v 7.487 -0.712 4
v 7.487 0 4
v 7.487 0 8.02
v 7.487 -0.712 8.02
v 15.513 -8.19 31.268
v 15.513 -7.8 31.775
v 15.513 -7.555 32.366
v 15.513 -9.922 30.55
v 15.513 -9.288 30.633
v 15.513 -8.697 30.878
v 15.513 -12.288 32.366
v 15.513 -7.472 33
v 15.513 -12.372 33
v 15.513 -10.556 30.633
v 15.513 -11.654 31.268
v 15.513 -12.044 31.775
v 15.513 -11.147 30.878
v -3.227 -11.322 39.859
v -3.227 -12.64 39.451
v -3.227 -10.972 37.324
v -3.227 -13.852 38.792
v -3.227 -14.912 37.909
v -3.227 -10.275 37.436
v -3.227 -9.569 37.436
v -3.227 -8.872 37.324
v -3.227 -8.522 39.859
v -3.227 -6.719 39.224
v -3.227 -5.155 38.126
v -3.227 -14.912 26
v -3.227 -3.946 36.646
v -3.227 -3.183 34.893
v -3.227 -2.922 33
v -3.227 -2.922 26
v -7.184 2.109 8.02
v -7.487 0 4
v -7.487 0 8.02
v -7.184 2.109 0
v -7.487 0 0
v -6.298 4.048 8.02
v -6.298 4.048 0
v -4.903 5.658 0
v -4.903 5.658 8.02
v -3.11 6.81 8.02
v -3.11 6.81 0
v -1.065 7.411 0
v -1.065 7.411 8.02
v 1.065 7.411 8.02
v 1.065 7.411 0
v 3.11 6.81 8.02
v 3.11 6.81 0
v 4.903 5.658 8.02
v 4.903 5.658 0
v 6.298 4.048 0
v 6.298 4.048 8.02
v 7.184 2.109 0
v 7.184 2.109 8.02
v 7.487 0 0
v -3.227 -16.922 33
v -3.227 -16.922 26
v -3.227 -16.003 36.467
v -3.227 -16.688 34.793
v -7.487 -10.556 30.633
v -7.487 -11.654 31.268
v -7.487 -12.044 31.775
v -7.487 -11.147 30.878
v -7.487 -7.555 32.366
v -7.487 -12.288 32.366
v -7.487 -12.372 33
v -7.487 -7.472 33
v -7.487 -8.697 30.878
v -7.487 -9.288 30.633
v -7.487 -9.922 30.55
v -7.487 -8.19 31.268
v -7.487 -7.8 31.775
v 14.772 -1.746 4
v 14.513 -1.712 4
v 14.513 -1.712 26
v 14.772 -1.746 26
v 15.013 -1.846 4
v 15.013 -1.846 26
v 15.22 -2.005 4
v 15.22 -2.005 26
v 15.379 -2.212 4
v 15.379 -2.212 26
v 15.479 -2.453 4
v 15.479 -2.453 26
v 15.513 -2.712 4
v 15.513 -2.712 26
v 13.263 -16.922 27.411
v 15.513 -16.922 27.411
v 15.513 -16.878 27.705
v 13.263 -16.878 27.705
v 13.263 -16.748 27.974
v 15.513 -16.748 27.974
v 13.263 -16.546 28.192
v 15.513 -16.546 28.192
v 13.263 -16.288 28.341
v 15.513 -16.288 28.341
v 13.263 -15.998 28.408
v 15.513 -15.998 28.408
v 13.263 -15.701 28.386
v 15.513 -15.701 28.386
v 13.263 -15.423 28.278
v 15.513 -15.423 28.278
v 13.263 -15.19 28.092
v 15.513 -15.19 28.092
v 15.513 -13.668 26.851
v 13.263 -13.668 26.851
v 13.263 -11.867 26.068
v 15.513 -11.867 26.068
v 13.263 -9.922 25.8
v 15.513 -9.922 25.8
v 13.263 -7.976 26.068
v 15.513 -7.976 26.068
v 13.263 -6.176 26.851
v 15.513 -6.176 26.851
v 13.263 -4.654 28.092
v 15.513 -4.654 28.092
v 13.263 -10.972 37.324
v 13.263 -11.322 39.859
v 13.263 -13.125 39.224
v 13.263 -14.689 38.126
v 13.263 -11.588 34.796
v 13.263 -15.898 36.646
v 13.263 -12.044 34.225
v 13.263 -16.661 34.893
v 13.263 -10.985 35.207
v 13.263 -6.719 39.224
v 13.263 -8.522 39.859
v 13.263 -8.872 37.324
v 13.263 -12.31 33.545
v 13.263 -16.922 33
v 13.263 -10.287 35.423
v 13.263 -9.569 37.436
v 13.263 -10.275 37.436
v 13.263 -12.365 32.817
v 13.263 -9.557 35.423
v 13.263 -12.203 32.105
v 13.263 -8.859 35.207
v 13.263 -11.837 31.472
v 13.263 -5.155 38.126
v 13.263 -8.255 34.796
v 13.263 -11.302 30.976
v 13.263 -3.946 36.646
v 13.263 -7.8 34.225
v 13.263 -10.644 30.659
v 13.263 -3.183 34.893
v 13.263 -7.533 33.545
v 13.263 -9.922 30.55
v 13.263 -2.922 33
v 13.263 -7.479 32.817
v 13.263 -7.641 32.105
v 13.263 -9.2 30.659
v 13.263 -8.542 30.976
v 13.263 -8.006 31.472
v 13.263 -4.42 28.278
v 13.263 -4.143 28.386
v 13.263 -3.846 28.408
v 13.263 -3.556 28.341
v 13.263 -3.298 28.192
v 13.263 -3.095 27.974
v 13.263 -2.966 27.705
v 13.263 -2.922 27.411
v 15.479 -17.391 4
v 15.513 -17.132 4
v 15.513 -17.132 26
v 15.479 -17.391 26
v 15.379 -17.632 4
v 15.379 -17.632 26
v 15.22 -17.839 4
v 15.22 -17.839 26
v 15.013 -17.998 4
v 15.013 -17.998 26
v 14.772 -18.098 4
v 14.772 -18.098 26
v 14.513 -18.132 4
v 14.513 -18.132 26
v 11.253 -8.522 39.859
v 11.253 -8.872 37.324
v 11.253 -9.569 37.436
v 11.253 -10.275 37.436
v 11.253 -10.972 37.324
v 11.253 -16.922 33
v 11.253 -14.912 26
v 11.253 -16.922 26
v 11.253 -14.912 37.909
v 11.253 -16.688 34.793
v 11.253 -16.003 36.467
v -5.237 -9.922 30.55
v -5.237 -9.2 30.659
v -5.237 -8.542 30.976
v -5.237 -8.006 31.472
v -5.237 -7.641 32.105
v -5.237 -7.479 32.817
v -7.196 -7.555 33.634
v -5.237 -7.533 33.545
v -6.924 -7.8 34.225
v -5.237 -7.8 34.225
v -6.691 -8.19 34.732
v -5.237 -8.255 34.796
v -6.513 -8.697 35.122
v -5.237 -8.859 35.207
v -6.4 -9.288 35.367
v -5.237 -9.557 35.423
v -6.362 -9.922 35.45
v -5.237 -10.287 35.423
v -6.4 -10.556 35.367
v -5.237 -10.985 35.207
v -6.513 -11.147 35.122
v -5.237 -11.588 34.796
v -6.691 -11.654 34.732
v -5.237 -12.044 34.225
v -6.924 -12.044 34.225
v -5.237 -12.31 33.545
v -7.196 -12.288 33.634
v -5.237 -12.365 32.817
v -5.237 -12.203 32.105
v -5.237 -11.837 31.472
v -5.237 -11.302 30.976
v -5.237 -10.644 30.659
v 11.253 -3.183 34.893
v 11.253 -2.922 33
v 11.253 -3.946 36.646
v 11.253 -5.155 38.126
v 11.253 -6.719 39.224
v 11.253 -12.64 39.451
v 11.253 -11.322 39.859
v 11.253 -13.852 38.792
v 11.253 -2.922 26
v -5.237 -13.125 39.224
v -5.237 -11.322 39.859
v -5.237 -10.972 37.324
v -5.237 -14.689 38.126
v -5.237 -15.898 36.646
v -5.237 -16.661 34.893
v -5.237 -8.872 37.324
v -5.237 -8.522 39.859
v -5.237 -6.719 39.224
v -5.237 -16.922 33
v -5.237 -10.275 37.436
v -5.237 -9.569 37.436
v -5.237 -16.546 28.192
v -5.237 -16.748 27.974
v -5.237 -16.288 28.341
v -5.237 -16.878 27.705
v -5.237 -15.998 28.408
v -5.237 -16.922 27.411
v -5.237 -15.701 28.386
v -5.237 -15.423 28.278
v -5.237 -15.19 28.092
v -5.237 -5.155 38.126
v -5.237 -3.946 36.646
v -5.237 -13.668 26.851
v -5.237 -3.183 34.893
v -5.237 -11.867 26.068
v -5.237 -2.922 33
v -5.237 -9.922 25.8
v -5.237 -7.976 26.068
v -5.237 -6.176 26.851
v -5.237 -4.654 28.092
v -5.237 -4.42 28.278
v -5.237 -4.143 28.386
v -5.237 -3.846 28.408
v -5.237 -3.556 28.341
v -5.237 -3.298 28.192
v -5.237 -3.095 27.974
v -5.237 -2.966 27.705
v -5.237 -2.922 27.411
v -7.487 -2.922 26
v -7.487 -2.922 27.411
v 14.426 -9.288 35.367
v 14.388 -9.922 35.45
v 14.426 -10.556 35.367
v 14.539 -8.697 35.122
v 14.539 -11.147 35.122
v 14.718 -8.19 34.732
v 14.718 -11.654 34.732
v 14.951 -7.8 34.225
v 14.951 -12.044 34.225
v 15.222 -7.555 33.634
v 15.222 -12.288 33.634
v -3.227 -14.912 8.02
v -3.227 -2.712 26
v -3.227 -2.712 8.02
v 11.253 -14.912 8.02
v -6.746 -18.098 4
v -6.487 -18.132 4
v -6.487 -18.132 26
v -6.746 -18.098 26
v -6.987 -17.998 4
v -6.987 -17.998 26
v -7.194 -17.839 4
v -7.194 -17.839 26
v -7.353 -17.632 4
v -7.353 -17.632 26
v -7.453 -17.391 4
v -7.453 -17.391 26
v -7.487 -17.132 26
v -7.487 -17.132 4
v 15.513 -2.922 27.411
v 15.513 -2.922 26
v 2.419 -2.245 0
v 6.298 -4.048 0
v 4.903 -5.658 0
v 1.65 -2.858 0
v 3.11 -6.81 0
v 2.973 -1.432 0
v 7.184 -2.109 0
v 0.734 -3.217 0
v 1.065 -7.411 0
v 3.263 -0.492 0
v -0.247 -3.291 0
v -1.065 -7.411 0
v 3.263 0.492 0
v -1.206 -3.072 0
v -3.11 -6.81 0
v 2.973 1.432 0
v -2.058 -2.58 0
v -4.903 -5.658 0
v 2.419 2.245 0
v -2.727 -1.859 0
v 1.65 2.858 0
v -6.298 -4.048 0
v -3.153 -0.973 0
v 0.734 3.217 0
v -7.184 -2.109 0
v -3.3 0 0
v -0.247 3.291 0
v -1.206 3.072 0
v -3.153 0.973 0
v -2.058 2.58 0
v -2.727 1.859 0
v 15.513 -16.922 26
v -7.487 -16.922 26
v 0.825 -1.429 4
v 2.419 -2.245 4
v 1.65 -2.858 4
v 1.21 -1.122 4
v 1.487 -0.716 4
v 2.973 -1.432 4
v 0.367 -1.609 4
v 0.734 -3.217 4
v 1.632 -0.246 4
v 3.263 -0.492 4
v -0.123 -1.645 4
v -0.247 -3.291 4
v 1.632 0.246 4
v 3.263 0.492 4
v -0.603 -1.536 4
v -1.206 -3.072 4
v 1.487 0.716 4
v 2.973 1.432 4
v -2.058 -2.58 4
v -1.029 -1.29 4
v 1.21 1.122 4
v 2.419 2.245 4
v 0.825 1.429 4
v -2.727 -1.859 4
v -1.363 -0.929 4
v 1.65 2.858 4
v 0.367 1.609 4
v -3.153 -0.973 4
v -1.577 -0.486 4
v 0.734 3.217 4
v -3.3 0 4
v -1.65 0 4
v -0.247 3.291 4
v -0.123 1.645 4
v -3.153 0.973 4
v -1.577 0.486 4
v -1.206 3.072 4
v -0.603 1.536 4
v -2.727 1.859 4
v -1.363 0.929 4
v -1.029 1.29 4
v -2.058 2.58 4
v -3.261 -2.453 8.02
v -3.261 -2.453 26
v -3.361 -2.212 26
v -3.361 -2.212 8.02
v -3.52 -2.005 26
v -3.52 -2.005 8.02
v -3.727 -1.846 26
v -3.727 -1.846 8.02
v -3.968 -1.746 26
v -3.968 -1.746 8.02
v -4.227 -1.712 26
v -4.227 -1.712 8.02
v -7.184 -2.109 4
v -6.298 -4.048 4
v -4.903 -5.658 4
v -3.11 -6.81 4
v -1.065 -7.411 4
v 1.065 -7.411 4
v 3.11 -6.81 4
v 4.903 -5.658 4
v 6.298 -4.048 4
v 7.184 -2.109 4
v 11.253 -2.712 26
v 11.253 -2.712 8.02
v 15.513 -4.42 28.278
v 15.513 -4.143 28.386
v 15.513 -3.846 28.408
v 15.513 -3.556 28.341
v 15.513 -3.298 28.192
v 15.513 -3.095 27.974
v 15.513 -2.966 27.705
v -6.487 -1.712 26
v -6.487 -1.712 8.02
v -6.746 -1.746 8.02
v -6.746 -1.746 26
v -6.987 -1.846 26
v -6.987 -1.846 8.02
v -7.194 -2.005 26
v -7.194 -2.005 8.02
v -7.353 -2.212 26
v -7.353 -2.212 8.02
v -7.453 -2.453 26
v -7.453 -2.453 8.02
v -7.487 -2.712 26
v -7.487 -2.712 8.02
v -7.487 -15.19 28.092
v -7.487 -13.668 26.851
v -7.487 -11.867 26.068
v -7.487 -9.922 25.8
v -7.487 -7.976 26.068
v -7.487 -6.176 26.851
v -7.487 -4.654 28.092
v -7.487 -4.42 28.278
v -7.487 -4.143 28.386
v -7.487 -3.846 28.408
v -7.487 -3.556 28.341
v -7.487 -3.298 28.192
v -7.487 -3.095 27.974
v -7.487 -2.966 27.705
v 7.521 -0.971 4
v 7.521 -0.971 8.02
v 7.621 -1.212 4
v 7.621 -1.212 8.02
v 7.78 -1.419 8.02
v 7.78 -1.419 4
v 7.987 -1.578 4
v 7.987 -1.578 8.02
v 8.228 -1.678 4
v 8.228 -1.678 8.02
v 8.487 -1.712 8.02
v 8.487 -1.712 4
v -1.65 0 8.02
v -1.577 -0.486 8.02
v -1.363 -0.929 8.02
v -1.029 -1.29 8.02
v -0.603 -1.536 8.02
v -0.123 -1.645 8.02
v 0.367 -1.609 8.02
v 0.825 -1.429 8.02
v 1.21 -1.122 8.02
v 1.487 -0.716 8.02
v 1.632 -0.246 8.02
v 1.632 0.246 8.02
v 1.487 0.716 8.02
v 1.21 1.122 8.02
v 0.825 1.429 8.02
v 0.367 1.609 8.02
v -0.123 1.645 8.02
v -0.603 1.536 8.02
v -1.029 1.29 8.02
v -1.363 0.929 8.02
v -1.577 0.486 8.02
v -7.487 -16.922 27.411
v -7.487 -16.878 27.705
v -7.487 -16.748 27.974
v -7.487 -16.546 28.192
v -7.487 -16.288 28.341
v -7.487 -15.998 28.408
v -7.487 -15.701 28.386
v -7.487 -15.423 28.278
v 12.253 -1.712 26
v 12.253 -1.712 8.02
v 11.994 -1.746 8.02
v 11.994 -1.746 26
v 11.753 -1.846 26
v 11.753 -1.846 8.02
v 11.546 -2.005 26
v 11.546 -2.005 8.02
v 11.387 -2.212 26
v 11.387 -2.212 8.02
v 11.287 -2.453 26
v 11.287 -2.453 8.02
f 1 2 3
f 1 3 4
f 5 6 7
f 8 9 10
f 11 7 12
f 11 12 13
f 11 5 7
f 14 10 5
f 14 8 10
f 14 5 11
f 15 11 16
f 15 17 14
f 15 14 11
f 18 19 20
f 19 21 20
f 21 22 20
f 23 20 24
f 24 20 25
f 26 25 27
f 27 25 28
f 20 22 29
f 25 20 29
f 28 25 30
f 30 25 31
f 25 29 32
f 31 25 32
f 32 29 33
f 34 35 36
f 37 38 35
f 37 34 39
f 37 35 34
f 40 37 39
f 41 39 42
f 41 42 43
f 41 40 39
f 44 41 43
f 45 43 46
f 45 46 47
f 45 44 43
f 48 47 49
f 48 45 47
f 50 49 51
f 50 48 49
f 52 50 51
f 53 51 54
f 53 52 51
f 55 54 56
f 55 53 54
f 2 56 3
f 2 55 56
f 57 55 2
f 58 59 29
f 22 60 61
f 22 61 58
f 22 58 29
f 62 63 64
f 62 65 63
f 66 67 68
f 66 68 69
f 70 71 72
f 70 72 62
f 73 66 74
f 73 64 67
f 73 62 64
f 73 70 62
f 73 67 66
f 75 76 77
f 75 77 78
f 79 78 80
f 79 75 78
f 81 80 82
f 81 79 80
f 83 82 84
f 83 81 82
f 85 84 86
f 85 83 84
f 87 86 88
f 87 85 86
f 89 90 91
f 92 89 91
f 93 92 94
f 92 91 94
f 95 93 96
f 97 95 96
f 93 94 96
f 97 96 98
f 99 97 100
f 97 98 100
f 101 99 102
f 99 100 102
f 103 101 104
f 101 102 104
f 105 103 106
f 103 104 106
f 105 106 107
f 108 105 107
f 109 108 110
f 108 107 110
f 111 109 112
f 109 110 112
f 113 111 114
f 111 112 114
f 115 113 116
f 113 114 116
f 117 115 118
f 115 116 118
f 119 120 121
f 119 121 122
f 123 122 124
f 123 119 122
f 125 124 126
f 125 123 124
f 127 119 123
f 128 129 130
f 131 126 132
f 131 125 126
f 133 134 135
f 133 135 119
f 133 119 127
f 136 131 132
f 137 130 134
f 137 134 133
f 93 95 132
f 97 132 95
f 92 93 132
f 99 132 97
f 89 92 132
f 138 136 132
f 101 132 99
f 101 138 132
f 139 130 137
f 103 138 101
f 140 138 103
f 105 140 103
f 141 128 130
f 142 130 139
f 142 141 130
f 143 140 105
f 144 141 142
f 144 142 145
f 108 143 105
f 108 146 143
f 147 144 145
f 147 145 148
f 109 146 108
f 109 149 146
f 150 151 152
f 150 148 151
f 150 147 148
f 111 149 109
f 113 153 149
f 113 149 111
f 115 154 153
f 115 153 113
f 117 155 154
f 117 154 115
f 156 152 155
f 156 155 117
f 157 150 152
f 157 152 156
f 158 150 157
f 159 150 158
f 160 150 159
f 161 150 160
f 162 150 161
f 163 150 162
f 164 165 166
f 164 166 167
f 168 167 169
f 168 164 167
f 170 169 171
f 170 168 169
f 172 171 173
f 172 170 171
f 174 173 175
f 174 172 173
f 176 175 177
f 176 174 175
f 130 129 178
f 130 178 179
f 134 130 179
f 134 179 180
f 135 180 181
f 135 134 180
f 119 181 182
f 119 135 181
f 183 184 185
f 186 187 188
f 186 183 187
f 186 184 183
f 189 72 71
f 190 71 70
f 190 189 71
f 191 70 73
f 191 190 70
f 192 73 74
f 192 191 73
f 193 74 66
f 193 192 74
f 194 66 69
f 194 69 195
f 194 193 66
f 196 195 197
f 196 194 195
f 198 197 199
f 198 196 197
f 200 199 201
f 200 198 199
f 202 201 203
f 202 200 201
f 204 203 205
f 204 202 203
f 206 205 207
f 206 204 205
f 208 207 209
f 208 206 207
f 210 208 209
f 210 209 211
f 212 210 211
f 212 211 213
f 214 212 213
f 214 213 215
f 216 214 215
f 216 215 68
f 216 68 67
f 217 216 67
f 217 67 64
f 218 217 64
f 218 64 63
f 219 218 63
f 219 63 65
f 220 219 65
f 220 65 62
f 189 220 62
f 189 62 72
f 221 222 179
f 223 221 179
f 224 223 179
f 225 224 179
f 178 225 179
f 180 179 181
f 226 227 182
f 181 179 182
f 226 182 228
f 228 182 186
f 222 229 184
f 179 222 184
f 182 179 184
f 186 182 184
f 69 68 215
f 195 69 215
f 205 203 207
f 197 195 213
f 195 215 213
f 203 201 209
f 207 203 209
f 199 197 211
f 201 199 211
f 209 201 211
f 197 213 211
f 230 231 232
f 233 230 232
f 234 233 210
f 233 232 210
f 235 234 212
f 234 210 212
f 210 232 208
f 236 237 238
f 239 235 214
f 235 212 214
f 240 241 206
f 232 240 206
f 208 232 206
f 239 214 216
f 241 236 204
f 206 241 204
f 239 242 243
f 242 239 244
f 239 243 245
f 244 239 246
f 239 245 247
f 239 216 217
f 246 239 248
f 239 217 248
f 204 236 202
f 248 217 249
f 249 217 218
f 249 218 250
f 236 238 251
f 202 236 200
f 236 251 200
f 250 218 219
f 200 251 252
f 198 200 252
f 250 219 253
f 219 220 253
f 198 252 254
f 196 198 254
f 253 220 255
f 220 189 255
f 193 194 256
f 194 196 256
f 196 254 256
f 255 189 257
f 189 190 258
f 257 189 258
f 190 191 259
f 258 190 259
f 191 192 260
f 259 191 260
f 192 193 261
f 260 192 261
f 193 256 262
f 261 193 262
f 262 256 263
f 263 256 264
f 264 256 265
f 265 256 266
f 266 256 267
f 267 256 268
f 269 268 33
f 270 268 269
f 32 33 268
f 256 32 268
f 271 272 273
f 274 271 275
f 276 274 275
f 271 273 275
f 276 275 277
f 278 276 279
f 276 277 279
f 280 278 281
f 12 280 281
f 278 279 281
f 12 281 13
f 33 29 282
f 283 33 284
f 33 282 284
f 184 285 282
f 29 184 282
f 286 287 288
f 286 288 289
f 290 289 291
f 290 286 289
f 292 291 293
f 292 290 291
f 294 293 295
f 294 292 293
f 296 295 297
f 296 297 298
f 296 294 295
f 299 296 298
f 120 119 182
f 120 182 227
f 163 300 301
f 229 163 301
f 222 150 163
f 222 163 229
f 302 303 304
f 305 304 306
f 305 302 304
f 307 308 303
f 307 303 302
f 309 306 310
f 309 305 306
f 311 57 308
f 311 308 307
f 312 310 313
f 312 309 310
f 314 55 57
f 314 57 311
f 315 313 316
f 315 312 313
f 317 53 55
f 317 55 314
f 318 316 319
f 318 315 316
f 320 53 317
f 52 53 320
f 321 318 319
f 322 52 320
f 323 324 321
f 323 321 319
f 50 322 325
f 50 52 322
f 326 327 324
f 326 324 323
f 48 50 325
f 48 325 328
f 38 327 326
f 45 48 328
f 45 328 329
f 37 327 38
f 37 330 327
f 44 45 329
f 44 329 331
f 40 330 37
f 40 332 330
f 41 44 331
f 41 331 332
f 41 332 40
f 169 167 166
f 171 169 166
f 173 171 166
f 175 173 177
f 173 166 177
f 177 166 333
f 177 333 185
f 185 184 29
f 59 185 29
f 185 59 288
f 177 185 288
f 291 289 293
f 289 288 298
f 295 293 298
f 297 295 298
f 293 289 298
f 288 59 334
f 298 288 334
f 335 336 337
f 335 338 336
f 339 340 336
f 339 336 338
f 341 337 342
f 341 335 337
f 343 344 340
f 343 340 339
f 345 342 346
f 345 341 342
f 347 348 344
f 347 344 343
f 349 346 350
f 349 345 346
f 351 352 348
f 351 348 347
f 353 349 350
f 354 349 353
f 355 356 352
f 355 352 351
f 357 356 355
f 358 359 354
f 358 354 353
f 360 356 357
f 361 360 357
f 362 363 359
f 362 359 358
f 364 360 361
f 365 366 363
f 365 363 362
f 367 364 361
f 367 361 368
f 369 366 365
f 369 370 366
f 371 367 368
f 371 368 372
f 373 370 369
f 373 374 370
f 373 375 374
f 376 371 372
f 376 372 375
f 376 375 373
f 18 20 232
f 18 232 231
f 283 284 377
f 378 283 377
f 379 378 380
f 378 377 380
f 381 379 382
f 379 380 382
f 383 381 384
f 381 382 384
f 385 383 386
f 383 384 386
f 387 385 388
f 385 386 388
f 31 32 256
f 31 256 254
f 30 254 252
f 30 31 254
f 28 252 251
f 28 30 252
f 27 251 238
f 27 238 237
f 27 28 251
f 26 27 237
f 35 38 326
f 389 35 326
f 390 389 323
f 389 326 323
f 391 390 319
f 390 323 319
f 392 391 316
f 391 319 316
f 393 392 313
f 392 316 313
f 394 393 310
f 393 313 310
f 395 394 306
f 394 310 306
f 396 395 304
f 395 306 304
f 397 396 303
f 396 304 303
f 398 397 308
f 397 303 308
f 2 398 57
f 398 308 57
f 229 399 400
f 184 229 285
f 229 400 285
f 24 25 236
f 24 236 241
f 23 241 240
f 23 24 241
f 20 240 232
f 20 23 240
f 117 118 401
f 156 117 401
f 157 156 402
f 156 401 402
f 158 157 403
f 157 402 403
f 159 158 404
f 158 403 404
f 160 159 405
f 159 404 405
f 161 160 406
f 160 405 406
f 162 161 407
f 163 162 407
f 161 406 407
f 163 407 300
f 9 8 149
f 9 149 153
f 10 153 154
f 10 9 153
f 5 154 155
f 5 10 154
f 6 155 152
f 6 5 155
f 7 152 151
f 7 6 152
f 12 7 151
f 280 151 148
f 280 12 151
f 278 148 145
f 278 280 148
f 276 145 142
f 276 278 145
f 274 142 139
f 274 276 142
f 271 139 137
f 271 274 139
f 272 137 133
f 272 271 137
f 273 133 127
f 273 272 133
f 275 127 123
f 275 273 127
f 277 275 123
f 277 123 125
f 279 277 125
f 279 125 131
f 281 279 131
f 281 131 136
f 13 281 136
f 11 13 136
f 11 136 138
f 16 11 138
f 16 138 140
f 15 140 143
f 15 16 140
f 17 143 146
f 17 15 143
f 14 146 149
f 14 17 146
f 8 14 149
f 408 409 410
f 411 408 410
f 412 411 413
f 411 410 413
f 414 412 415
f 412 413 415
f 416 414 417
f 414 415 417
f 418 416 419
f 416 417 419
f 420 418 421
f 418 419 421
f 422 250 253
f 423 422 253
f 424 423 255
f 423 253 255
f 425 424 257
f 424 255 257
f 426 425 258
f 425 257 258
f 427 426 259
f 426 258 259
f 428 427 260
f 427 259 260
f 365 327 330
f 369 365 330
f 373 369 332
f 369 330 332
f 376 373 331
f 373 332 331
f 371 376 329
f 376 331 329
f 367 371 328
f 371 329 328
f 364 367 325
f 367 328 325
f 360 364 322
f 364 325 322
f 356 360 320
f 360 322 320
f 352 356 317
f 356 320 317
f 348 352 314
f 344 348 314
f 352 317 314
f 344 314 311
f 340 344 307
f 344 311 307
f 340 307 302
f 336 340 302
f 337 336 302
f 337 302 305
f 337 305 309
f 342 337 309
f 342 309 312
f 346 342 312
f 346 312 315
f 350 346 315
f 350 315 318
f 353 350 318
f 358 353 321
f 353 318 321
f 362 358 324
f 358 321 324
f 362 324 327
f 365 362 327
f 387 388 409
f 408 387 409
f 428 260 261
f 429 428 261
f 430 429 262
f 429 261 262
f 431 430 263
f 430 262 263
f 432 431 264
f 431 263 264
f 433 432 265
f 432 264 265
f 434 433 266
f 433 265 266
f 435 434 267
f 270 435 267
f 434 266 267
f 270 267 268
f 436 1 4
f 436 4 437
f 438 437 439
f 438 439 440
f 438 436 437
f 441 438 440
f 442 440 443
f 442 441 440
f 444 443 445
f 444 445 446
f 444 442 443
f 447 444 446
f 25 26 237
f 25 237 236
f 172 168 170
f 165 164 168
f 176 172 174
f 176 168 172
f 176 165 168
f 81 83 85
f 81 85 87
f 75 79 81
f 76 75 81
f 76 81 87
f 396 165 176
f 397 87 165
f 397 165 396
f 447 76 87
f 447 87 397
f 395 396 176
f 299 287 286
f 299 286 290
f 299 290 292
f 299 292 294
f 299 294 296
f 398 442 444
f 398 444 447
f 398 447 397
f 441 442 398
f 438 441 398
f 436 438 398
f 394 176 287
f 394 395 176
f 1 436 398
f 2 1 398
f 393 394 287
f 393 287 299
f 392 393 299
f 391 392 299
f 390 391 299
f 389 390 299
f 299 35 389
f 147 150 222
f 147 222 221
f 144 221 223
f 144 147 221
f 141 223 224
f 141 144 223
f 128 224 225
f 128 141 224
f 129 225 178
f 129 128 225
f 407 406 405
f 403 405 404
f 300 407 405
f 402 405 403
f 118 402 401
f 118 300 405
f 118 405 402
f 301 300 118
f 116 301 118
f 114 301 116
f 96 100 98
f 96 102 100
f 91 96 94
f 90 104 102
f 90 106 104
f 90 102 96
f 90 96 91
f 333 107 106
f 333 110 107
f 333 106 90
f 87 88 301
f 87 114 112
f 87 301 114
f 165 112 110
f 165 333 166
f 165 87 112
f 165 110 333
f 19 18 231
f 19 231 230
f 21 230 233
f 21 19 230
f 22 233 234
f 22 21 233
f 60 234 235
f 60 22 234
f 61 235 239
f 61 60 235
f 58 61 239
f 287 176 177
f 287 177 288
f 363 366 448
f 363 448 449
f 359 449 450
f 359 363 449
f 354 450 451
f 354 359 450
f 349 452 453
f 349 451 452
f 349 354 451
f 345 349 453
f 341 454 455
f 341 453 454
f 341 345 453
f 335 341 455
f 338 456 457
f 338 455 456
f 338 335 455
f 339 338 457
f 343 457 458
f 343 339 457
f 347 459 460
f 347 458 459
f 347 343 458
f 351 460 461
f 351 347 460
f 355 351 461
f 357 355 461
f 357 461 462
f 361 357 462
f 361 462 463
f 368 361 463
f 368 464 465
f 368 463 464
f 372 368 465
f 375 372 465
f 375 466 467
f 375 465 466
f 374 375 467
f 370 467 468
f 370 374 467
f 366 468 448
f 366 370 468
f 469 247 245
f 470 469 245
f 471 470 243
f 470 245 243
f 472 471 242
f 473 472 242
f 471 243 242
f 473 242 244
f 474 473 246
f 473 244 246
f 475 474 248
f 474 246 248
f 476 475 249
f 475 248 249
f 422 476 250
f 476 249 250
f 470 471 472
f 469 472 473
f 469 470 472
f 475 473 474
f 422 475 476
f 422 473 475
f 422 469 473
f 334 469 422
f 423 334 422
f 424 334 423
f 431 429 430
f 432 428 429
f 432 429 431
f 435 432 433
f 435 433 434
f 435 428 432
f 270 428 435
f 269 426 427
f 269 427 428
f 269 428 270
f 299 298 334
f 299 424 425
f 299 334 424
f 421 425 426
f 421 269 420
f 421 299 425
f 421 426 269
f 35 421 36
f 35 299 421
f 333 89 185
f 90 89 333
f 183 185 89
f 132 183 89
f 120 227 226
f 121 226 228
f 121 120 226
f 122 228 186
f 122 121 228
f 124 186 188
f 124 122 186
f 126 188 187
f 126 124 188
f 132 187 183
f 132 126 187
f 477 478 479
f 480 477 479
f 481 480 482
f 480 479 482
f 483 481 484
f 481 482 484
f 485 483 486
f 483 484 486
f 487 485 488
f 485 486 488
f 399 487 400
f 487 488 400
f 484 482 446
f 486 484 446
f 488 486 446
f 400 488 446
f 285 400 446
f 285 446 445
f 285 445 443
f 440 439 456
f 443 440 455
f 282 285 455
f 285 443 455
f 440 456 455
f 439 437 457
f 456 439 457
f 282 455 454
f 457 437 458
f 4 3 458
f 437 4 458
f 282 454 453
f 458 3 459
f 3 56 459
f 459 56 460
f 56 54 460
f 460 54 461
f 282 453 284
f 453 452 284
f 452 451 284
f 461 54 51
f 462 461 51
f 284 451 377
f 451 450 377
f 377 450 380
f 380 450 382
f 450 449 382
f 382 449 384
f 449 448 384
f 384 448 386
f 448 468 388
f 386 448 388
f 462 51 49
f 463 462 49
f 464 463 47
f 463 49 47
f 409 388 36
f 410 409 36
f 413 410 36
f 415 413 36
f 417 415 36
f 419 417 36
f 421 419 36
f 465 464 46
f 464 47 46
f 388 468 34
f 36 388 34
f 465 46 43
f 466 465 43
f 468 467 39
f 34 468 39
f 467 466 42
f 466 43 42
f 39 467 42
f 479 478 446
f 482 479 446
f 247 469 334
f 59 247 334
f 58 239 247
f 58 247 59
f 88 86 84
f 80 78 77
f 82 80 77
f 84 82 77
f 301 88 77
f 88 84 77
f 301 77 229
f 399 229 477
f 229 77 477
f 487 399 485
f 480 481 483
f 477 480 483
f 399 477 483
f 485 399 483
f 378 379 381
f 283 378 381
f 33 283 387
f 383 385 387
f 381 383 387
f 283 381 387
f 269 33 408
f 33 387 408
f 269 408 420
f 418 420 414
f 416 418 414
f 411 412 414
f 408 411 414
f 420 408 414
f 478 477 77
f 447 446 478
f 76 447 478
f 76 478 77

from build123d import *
from build123d.topology import SkipClean

# Parameters (mm, degrees)
SKETCH1_R           = 1.65
BOSS_EXTRUDE1_DEPTH = 40
CUT_EXTRUDE1_START  = -31.98
CUT_EXTRUDE1_DEPTH  = 31.98
SKETCH3_R           = 3.3
CUT_EXTRUDE2_DEPTH  = 4
CUT_EXTRUDE3_DEPTH  = 14
CUT_EXTRUDE4_REACH  = 51.576
SKETCH6_R           = 2.45
CUT_EXTRUDE5_DEPTH  = 2.25
CUT_EXTRUDE6_START  = -20.75
SKETCH6_2_R         = 2.45
CUT_EXTRUDE6_DEPTH  = 2.25
CUT_EXTRUDE7_START  = -9.45
CUT_EXTRUDE7_DEPTH  = 4.9


with BuildPart() as part:
    # Sketch1 → Boss-Extrude1 (new body)
    with BuildSketch(Plane.XY):
        with BuildLine():
            Line((8.48683607, -1.711916105), (14.51316393, -1.711916105))
            ThreePointArc((14.51316393, -1.711916105), (15.220270711, -2.004809324), (15.51316393, -2.711916105))
            Line((15.51316393, -2.711916105), (15.51316393, -17.131916105))
            ThreePointArc((15.51316393, -17.131916105), (15.220270711, -17.839022886), (14.51316393, -18.131916105))
            Line((14.51316393, -18.131916105), (-6.48683607, -18.131916105))
            ThreePointArc((-6.48683607, -18.131916105), (-7.193942851, -17.839022886), (-7.48683607, -17.131916105))
            Line((-7.48683607, -17.131916105), (-7.48683607, 0))
            ThreePointArc((-7.48683607, 0), (0, 7.48683607), (7.48683607, 0))
            Line((7.48683607, 0), (7.48683607, -0.711916105))
            ThreePointArc((7.48683607, -0.711916105), (7.779729289, -1.419022886), (8.48683607, -1.711916105))
        make_face()
        with Locations(Location((0, 0, 0), (0, 0, 180))):
            Circle(SKETCH1_R, mode=Mode.SUBTRACT)
    extrude(amount=BOSS_EXTRUDE1_DEPTH)

    # Sketch2 → Cut-Extrude1 (cut)
    with BuildSketch(Plane.XY.offset(40).offset(CUT_EXTRUDE1_START)):
        with BuildLine():
            Line((-3.22683607, -14.911916105), (-3.22683607, -2.711916105))
            ThreePointArc((-3.22683607, -2.711916105), (-3.519729289, -2.004809324), (-4.22683607, -1.711916105))
            Line((-4.22683607, -1.711916105), (-6.48683607, -1.711916105))
            ThreePointArc((-6.48683607, -1.711916105), (-7.193942851, -2.004809324), (-7.48683607, -2.711916105))
            Line((-7.48683607, -2.711916105), (-7.48683607, 0))
            ThreePointArc((-7.48683607, 0), (0, 7.48683607), (7.48683607, 0))
            Line((7.48683607, 0), (7.48683607, -0.711916105))
            ThreePointArc((7.48683607, -0.711916105), (7.779729289, -1.419022886), (8.48683607, -1.711916105))
            Line((8.48683607, -1.711916105), (12.25316393, -1.711916105))
            ThreePointArc((12.25316393, -1.711916105), (11.546057149, -2.004809324), (11.25316393, -2.711916105))
            Line((11.25316393, -2.711916105), (11.25316393, -14.911916105))
            Line((11.25316393, -14.911916105), (-3.22683607, -14.911916105))
        make_face()
    extrude(amount=CUT_EXTRUDE1_DEPTH, mode=Mode.SUBTRACT)

    # Sketch3 → Cut-Extrude2 (cut)
    with SkipClean():  # the faces are left unmerged after this step: merging them gives an invalid solid
        with BuildSketch(Plane(origin=(0, 0, 0), x_dir=(-1, 0, 0), z_dir=(0, 0, -1))):
            Circle(SKETCH3_R)
            with BuildLine():
                Line((-7.48683607, 0), (-7.48683607, -0.711916105))
                ThreePointArc((-7.48683607, -0.711916105), (-7.779729289, -1.419022886), (-8.48683607, -1.711916105))
                Line((-8.48683607, -1.711916105), (-14.51316393, -1.711916105))
                ThreePointArc((-14.51316393, -1.711916105), (-15.220270711, -2.004809324), (-15.51316393, -2.711916105))
                Line((-15.51316393, -2.711916105), (-15.51316393, -17.131916105))
                ThreePointArc((-15.51316393, -17.131916105), (-15.220270711, -17.839022886), (-14.51316393, -18.131916105))
                Line((-14.51316393, -18.131916105), (6.48683607, -18.131916105))
                ThreePointArc((6.48683607, -18.131916105), (7.193942851, -17.839022886), (7.48683607, -17.131916105))
                Line((7.48683607, -17.131916105), (7.48683607, 0))
                ThreePointArc((7.48683607, 0), (0, -7.48683607), (-7.48683607, 0))
            make_face()
        extrude(amount=-CUT_EXTRUDE2_DEPTH, mode=Mode.SUBTRACT)
    add(part.part.scale(1), mode=Mode.REPLACE)  # the faces are merged on a copy

    # Sketch4 → Cut-Extrude3 (cut)
    with BuildSketch(Plane.XY.offset(40)):
        Polygon((-3.22683607, -16.921916105), (-3.22683607, -2.921916105), (-7.48683607, -2.921916105), (-7.48683607, -1.711916105), (15.51316393, -1.711916105), (15.51316393, -2.921916105), (11.25316393, -2.921916105), (11.25316393, -16.921916105), (15.51316393, -16.921916105), (15.51316393, -18.131916105), (-7.48683607, -18.131916105), (-7.48683607, -16.921916105), align=None)
    extrude(amount=-CUT_EXTRUDE3_DEPTH, mode=Mode.SUBTRACT)

    # Cut-Extrude4: up to this face of the body (flat: up to its plane)
    cut_extrude4_end = Plane(part.part.faces().sort_by_distance((-7.48683607, -9.743748244, 21.544013895))[0])
    # Sketch5 → Cut-Extrude4 (cut, up to the picked face)
    with BuildSketch(Plane(origin=(15.51316393, 0, 0), x_dir=(0, 0, -1), z_dir=(1, 0, 0)), mode=Mode.PRIVATE) as cut_extrude4_sk1:
        with BuildLine():
            Line((-39.85857128, -8.521916105), (-37.324349662, -8.871916105))
            ThreePointArc((-37.324349662, -8.871916105), (-37.45, -9.921916105), (-37.324349662, -10.971916105))
            Line((-37.324349662, -10.971916105), (-39.85857128, -11.321916105))
            ThreePointArc((-39.85857128, -11.321916105), (-37.427188724, -15.34409279), (-33, -16.921916105))
            Line((-33, -16.921916105), (-40, -16.921916105))
            Line((-40, -16.921916105), (-40, -2.921916105))
            Line((-40, -2.921916105), (-33, -2.921916105))
            ThreePointArc((-33, -2.921916105), (-37.427188724, -4.49973942), (-39.85857128, -8.521916105))
        make_face()
    cut_extrude4_tool1 = split(extrude(cut_extrude4_sk1.sketch, amount=-CUT_EXTRUDE4_REACH, mode=Mode.PRIVATE), bisect_by=cut_extrude4_end, keep=Keep.BOTH, mode=Mode.PRIVATE)
    add(cut_extrude4_tool1.solids().sort_by(Axis((15.513164, -9.921916, 38.506526), (-1, 0, 0)))[0], mode=Mode.SUBTRACT)

    # Sketch6 → Cut-Extrude5 (cut)
    with BuildSketch(Plane(origin=(15.51316393, 0, 0), x_dir=(0, 0, -1), z_dir=(1, 0, 0))):
        with BuildLine():
            Line((-27.410724555, -2.921916105), (-31.314770045, -2.921916105))
            ThreePointArc((-31.314770045, -2.921916105), (-40.2, -9.921916105), (-31.314770045, -16.921916105))
            Line((-31.314770045, -16.921916105), (-27.410724555, -16.921916105))
            ThreePointArc((-27.410724555, -16.921916105), (-28.341237133, -16.288176042), (-28.092343512, -15.190208788))
            ThreePointArc((-28.092343512, -15.190208788), (-25.8, -9.921916105), (-28.092343512, -4.653623422))
            ThreePointArc((-28.092343512, -4.653623422), (-28.341237133, -3.555656168), (-27.410724555, -2.921916105))
        make_face()
        with Locations((-33, -9.921916105)):
            Circle(SKETCH6_R, mode=Mode.SUBTRACT)
    extrude(amount=-CUT_EXTRUDE5_DEPTH, mode=Mode.SUBTRACT)

    # Sketch6<2> → Cut-Extrude6 (cut)
    with BuildSketch(Plane(origin=(15.51316393, 0, 0), x_dir=(0, 0, -1), z_dir=(1, 0, 0)).offset(CUT_EXTRUDE6_START)):
        with BuildLine():
            Line((-27.410724555, -2.921916105), (-31.314770045, -2.921916105))
            ThreePointArc((-31.314770045, -2.921916105), (-40.2, -9.921916105), (-31.314770045, -16.921916105))
            Line((-31.314770045, -16.921916105), (-27.410724555, -16.921916105))
            ThreePointArc((-27.410724555, -16.921916105), (-28.341237133, -16.288176042), (-28.092343512, -15.190208788))
            ThreePointArc((-28.092343512, -15.190208788), (-25.8, -9.921916105), (-28.092343512, -4.653623422))
            ThreePointArc((-28.092343512, -4.653623422), (-28.341237133, -3.555656168), (-27.410724555, -2.921916105))
        make_face()
        with Locations((-33, -9.921916105)):
            Circle(SKETCH6_2_R, mode=Mode.SUBTRACT)
    extrude(amount=-CUT_EXTRUDE6_DEPTH, mode=Mode.SUBTRACT)

    # Sketch7 → Cut-Extrude7 (cut)
    with BuildSketch(Plane(origin=(0, -2.921916105, 0), x_dir=(1, 0, 0), z_dir=(0, 1, 0)).offset(CUT_EXTRUDE7_START)):
        Polygon((-7.48683607, -33), (-6.36183607, -35.45), (-7.48683607, -35.45), align=None)
        Polygon((15.51316393, -33), (15.51316393, -35.45), (14.38816393, -35.45), align=None)
    extrude(amount=CUT_EXTRUDE7_DEPTH, mode=Mode.SUBTRACT)


solid = part.part
